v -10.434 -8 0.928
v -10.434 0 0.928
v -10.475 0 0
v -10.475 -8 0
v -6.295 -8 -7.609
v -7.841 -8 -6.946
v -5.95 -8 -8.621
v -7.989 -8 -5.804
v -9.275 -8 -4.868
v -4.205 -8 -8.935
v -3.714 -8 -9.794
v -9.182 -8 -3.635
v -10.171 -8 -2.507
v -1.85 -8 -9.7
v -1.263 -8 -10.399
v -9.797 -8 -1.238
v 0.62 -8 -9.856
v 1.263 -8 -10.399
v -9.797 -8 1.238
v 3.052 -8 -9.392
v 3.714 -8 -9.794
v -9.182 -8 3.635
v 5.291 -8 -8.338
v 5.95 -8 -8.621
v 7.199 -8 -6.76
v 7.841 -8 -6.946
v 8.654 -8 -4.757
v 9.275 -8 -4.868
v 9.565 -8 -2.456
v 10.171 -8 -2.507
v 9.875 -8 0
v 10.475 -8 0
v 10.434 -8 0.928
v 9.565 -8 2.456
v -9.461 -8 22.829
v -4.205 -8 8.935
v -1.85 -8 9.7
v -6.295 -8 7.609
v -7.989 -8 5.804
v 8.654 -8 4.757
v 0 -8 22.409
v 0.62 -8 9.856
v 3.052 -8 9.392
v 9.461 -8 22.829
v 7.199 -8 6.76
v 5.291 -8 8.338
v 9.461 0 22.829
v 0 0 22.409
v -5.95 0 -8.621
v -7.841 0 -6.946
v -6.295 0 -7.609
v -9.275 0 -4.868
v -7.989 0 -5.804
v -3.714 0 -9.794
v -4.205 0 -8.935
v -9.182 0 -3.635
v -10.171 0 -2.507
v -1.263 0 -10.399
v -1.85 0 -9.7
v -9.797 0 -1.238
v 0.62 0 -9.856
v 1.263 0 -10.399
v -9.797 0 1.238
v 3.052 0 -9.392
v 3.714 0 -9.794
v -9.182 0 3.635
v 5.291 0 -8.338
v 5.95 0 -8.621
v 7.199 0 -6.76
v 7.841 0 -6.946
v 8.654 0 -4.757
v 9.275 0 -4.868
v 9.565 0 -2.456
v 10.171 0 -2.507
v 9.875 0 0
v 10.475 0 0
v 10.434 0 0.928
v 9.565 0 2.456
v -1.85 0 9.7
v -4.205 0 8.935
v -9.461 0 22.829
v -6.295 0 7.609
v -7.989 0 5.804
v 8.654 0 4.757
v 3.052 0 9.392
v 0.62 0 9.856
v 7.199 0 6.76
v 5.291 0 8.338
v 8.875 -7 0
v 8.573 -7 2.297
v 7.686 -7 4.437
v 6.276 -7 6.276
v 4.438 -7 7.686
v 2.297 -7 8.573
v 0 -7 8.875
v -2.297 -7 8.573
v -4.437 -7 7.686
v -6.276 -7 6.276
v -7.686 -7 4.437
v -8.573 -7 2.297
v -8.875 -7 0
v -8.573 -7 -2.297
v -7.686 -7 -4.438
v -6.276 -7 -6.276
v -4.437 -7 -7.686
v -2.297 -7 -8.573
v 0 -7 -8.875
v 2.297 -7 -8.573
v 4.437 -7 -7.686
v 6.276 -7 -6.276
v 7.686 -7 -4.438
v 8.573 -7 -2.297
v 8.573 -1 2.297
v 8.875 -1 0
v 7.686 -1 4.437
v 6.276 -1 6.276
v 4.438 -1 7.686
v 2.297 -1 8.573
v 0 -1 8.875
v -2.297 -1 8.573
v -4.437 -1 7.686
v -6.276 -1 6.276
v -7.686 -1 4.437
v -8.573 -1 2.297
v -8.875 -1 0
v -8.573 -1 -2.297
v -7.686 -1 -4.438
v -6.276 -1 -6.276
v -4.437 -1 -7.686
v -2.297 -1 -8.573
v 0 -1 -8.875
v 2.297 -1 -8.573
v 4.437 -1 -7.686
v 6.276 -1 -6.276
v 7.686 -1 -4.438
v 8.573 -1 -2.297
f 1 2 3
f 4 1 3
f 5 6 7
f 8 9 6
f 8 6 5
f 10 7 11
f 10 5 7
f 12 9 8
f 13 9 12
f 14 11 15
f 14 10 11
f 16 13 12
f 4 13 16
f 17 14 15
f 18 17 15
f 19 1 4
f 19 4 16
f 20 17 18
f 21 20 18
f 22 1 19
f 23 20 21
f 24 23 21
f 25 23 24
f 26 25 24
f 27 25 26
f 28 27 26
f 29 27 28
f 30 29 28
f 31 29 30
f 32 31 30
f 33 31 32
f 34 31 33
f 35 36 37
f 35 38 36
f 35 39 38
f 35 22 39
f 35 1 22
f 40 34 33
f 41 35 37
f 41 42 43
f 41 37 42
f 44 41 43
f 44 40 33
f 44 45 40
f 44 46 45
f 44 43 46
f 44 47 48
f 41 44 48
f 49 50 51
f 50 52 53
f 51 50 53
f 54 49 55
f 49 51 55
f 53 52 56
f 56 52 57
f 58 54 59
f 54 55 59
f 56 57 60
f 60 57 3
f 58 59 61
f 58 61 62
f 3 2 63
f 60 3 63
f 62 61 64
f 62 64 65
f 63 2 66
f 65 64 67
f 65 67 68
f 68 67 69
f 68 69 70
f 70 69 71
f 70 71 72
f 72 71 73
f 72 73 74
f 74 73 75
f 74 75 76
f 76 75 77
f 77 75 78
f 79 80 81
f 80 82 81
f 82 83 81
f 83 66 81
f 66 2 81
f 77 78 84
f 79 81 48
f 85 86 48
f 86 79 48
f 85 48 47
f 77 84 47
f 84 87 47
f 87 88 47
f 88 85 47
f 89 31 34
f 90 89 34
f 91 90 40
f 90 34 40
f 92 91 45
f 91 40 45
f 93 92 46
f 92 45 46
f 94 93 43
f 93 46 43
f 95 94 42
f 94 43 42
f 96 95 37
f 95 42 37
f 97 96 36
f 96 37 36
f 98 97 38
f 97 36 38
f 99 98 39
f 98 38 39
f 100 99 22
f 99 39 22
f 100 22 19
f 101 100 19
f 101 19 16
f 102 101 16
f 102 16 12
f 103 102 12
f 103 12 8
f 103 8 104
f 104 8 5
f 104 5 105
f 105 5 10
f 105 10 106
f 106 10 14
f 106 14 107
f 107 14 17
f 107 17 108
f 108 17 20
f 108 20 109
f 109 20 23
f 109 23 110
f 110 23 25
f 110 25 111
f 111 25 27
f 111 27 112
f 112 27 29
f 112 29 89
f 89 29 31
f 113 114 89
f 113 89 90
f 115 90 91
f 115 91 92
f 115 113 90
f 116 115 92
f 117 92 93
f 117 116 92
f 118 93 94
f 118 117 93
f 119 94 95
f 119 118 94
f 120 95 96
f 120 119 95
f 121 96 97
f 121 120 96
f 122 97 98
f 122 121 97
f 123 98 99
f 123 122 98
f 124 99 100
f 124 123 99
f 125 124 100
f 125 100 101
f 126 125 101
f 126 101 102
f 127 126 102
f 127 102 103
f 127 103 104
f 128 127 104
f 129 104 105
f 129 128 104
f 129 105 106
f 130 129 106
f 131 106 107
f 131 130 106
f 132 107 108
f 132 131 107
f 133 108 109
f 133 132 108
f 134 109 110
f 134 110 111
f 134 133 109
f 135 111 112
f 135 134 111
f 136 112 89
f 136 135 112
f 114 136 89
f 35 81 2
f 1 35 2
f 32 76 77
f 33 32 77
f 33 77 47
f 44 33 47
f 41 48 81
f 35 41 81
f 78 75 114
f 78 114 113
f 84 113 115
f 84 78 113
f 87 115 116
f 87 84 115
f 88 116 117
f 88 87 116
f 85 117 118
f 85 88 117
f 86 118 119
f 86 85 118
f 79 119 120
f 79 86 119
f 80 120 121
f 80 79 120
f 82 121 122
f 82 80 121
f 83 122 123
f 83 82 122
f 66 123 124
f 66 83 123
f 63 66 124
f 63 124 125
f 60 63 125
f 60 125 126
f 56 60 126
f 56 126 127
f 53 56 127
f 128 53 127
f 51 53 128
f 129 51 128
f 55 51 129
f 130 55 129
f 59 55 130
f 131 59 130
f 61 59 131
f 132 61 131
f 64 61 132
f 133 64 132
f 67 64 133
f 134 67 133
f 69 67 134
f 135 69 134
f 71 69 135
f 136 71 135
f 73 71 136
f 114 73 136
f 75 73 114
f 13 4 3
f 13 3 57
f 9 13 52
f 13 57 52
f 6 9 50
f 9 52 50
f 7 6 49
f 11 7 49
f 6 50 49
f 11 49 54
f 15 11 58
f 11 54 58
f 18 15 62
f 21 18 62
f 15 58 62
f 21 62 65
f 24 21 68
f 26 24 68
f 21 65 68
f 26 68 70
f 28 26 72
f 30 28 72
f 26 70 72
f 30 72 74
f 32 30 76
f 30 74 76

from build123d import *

# Parameters (mm, degrees)
F0_R     = 8.875
F1_DEPTH = 8
F2_SIZE  = 1


with BuildPart() as f1:
    # F0 (on Front) → F1 (new body)
    with BuildSketch(Plane.XZ):
        with BuildLine():
            ThreePointArc((0, 10.475), (7.071068, 7.728236), (10.433771, 0.928461))
            Line((10.433771, 0.928461), (9.461263, 22.829172))
            Line((9.461263, 22.829172), (0, 22.409042))
            Line((0, 22.409042), (0.528892, 22.385556))
            Line((0.528892, 22.385556), (0, 10.475))
        make_face()
        Polygon((-0.528892, 22.385556), (0, 10.475), (0.528892, 22.385556), (0, 22.409042), align=None)
        with BuildLine():
            Line((-10.433771, 0.928461), (-10.475, 0))
            ThreePointArc((-10.475, 0), (0, -10.475), (10.475, 0))
            Line((10.475, 0), (10.433771, 0.928461))
            ThreePointArc((10.433771, 0.928461), (7.071068, 7.728236), (0, 10.475))
            ThreePointArc((0, 10.475), (-7.071068, 7.728236), (-10.433771, 0.928461))
        make_face()
        Circle(F0_R, mode=Mode.SUBTRACT)
        with BuildLine():
            Line((-9.461263, 22.829172), (-10.433771, 0.928461))
            ThreePointArc((-10.433771, 0.928461), (-7.071068, 7.728236), (0, 10.475))
            Line((0, 10.475), (-0.528892, 22.385556))
            Line((-0.528892, 22.385556), (0, 22.409042))
            Line((0, 22.409042), (-9.461263, 22.829172))
        make_face()
    extrude(amount=F1_DEPTH)

    # F2
    f2_edges = [f1.edges().sort_by_distance(p)[0] for p in [
        (-8.875, 0, 0),
        (-8.875, -8, 0),
    ]]
    chamfer(f2_edges, length=F2_SIZE)


solid = f1.part
